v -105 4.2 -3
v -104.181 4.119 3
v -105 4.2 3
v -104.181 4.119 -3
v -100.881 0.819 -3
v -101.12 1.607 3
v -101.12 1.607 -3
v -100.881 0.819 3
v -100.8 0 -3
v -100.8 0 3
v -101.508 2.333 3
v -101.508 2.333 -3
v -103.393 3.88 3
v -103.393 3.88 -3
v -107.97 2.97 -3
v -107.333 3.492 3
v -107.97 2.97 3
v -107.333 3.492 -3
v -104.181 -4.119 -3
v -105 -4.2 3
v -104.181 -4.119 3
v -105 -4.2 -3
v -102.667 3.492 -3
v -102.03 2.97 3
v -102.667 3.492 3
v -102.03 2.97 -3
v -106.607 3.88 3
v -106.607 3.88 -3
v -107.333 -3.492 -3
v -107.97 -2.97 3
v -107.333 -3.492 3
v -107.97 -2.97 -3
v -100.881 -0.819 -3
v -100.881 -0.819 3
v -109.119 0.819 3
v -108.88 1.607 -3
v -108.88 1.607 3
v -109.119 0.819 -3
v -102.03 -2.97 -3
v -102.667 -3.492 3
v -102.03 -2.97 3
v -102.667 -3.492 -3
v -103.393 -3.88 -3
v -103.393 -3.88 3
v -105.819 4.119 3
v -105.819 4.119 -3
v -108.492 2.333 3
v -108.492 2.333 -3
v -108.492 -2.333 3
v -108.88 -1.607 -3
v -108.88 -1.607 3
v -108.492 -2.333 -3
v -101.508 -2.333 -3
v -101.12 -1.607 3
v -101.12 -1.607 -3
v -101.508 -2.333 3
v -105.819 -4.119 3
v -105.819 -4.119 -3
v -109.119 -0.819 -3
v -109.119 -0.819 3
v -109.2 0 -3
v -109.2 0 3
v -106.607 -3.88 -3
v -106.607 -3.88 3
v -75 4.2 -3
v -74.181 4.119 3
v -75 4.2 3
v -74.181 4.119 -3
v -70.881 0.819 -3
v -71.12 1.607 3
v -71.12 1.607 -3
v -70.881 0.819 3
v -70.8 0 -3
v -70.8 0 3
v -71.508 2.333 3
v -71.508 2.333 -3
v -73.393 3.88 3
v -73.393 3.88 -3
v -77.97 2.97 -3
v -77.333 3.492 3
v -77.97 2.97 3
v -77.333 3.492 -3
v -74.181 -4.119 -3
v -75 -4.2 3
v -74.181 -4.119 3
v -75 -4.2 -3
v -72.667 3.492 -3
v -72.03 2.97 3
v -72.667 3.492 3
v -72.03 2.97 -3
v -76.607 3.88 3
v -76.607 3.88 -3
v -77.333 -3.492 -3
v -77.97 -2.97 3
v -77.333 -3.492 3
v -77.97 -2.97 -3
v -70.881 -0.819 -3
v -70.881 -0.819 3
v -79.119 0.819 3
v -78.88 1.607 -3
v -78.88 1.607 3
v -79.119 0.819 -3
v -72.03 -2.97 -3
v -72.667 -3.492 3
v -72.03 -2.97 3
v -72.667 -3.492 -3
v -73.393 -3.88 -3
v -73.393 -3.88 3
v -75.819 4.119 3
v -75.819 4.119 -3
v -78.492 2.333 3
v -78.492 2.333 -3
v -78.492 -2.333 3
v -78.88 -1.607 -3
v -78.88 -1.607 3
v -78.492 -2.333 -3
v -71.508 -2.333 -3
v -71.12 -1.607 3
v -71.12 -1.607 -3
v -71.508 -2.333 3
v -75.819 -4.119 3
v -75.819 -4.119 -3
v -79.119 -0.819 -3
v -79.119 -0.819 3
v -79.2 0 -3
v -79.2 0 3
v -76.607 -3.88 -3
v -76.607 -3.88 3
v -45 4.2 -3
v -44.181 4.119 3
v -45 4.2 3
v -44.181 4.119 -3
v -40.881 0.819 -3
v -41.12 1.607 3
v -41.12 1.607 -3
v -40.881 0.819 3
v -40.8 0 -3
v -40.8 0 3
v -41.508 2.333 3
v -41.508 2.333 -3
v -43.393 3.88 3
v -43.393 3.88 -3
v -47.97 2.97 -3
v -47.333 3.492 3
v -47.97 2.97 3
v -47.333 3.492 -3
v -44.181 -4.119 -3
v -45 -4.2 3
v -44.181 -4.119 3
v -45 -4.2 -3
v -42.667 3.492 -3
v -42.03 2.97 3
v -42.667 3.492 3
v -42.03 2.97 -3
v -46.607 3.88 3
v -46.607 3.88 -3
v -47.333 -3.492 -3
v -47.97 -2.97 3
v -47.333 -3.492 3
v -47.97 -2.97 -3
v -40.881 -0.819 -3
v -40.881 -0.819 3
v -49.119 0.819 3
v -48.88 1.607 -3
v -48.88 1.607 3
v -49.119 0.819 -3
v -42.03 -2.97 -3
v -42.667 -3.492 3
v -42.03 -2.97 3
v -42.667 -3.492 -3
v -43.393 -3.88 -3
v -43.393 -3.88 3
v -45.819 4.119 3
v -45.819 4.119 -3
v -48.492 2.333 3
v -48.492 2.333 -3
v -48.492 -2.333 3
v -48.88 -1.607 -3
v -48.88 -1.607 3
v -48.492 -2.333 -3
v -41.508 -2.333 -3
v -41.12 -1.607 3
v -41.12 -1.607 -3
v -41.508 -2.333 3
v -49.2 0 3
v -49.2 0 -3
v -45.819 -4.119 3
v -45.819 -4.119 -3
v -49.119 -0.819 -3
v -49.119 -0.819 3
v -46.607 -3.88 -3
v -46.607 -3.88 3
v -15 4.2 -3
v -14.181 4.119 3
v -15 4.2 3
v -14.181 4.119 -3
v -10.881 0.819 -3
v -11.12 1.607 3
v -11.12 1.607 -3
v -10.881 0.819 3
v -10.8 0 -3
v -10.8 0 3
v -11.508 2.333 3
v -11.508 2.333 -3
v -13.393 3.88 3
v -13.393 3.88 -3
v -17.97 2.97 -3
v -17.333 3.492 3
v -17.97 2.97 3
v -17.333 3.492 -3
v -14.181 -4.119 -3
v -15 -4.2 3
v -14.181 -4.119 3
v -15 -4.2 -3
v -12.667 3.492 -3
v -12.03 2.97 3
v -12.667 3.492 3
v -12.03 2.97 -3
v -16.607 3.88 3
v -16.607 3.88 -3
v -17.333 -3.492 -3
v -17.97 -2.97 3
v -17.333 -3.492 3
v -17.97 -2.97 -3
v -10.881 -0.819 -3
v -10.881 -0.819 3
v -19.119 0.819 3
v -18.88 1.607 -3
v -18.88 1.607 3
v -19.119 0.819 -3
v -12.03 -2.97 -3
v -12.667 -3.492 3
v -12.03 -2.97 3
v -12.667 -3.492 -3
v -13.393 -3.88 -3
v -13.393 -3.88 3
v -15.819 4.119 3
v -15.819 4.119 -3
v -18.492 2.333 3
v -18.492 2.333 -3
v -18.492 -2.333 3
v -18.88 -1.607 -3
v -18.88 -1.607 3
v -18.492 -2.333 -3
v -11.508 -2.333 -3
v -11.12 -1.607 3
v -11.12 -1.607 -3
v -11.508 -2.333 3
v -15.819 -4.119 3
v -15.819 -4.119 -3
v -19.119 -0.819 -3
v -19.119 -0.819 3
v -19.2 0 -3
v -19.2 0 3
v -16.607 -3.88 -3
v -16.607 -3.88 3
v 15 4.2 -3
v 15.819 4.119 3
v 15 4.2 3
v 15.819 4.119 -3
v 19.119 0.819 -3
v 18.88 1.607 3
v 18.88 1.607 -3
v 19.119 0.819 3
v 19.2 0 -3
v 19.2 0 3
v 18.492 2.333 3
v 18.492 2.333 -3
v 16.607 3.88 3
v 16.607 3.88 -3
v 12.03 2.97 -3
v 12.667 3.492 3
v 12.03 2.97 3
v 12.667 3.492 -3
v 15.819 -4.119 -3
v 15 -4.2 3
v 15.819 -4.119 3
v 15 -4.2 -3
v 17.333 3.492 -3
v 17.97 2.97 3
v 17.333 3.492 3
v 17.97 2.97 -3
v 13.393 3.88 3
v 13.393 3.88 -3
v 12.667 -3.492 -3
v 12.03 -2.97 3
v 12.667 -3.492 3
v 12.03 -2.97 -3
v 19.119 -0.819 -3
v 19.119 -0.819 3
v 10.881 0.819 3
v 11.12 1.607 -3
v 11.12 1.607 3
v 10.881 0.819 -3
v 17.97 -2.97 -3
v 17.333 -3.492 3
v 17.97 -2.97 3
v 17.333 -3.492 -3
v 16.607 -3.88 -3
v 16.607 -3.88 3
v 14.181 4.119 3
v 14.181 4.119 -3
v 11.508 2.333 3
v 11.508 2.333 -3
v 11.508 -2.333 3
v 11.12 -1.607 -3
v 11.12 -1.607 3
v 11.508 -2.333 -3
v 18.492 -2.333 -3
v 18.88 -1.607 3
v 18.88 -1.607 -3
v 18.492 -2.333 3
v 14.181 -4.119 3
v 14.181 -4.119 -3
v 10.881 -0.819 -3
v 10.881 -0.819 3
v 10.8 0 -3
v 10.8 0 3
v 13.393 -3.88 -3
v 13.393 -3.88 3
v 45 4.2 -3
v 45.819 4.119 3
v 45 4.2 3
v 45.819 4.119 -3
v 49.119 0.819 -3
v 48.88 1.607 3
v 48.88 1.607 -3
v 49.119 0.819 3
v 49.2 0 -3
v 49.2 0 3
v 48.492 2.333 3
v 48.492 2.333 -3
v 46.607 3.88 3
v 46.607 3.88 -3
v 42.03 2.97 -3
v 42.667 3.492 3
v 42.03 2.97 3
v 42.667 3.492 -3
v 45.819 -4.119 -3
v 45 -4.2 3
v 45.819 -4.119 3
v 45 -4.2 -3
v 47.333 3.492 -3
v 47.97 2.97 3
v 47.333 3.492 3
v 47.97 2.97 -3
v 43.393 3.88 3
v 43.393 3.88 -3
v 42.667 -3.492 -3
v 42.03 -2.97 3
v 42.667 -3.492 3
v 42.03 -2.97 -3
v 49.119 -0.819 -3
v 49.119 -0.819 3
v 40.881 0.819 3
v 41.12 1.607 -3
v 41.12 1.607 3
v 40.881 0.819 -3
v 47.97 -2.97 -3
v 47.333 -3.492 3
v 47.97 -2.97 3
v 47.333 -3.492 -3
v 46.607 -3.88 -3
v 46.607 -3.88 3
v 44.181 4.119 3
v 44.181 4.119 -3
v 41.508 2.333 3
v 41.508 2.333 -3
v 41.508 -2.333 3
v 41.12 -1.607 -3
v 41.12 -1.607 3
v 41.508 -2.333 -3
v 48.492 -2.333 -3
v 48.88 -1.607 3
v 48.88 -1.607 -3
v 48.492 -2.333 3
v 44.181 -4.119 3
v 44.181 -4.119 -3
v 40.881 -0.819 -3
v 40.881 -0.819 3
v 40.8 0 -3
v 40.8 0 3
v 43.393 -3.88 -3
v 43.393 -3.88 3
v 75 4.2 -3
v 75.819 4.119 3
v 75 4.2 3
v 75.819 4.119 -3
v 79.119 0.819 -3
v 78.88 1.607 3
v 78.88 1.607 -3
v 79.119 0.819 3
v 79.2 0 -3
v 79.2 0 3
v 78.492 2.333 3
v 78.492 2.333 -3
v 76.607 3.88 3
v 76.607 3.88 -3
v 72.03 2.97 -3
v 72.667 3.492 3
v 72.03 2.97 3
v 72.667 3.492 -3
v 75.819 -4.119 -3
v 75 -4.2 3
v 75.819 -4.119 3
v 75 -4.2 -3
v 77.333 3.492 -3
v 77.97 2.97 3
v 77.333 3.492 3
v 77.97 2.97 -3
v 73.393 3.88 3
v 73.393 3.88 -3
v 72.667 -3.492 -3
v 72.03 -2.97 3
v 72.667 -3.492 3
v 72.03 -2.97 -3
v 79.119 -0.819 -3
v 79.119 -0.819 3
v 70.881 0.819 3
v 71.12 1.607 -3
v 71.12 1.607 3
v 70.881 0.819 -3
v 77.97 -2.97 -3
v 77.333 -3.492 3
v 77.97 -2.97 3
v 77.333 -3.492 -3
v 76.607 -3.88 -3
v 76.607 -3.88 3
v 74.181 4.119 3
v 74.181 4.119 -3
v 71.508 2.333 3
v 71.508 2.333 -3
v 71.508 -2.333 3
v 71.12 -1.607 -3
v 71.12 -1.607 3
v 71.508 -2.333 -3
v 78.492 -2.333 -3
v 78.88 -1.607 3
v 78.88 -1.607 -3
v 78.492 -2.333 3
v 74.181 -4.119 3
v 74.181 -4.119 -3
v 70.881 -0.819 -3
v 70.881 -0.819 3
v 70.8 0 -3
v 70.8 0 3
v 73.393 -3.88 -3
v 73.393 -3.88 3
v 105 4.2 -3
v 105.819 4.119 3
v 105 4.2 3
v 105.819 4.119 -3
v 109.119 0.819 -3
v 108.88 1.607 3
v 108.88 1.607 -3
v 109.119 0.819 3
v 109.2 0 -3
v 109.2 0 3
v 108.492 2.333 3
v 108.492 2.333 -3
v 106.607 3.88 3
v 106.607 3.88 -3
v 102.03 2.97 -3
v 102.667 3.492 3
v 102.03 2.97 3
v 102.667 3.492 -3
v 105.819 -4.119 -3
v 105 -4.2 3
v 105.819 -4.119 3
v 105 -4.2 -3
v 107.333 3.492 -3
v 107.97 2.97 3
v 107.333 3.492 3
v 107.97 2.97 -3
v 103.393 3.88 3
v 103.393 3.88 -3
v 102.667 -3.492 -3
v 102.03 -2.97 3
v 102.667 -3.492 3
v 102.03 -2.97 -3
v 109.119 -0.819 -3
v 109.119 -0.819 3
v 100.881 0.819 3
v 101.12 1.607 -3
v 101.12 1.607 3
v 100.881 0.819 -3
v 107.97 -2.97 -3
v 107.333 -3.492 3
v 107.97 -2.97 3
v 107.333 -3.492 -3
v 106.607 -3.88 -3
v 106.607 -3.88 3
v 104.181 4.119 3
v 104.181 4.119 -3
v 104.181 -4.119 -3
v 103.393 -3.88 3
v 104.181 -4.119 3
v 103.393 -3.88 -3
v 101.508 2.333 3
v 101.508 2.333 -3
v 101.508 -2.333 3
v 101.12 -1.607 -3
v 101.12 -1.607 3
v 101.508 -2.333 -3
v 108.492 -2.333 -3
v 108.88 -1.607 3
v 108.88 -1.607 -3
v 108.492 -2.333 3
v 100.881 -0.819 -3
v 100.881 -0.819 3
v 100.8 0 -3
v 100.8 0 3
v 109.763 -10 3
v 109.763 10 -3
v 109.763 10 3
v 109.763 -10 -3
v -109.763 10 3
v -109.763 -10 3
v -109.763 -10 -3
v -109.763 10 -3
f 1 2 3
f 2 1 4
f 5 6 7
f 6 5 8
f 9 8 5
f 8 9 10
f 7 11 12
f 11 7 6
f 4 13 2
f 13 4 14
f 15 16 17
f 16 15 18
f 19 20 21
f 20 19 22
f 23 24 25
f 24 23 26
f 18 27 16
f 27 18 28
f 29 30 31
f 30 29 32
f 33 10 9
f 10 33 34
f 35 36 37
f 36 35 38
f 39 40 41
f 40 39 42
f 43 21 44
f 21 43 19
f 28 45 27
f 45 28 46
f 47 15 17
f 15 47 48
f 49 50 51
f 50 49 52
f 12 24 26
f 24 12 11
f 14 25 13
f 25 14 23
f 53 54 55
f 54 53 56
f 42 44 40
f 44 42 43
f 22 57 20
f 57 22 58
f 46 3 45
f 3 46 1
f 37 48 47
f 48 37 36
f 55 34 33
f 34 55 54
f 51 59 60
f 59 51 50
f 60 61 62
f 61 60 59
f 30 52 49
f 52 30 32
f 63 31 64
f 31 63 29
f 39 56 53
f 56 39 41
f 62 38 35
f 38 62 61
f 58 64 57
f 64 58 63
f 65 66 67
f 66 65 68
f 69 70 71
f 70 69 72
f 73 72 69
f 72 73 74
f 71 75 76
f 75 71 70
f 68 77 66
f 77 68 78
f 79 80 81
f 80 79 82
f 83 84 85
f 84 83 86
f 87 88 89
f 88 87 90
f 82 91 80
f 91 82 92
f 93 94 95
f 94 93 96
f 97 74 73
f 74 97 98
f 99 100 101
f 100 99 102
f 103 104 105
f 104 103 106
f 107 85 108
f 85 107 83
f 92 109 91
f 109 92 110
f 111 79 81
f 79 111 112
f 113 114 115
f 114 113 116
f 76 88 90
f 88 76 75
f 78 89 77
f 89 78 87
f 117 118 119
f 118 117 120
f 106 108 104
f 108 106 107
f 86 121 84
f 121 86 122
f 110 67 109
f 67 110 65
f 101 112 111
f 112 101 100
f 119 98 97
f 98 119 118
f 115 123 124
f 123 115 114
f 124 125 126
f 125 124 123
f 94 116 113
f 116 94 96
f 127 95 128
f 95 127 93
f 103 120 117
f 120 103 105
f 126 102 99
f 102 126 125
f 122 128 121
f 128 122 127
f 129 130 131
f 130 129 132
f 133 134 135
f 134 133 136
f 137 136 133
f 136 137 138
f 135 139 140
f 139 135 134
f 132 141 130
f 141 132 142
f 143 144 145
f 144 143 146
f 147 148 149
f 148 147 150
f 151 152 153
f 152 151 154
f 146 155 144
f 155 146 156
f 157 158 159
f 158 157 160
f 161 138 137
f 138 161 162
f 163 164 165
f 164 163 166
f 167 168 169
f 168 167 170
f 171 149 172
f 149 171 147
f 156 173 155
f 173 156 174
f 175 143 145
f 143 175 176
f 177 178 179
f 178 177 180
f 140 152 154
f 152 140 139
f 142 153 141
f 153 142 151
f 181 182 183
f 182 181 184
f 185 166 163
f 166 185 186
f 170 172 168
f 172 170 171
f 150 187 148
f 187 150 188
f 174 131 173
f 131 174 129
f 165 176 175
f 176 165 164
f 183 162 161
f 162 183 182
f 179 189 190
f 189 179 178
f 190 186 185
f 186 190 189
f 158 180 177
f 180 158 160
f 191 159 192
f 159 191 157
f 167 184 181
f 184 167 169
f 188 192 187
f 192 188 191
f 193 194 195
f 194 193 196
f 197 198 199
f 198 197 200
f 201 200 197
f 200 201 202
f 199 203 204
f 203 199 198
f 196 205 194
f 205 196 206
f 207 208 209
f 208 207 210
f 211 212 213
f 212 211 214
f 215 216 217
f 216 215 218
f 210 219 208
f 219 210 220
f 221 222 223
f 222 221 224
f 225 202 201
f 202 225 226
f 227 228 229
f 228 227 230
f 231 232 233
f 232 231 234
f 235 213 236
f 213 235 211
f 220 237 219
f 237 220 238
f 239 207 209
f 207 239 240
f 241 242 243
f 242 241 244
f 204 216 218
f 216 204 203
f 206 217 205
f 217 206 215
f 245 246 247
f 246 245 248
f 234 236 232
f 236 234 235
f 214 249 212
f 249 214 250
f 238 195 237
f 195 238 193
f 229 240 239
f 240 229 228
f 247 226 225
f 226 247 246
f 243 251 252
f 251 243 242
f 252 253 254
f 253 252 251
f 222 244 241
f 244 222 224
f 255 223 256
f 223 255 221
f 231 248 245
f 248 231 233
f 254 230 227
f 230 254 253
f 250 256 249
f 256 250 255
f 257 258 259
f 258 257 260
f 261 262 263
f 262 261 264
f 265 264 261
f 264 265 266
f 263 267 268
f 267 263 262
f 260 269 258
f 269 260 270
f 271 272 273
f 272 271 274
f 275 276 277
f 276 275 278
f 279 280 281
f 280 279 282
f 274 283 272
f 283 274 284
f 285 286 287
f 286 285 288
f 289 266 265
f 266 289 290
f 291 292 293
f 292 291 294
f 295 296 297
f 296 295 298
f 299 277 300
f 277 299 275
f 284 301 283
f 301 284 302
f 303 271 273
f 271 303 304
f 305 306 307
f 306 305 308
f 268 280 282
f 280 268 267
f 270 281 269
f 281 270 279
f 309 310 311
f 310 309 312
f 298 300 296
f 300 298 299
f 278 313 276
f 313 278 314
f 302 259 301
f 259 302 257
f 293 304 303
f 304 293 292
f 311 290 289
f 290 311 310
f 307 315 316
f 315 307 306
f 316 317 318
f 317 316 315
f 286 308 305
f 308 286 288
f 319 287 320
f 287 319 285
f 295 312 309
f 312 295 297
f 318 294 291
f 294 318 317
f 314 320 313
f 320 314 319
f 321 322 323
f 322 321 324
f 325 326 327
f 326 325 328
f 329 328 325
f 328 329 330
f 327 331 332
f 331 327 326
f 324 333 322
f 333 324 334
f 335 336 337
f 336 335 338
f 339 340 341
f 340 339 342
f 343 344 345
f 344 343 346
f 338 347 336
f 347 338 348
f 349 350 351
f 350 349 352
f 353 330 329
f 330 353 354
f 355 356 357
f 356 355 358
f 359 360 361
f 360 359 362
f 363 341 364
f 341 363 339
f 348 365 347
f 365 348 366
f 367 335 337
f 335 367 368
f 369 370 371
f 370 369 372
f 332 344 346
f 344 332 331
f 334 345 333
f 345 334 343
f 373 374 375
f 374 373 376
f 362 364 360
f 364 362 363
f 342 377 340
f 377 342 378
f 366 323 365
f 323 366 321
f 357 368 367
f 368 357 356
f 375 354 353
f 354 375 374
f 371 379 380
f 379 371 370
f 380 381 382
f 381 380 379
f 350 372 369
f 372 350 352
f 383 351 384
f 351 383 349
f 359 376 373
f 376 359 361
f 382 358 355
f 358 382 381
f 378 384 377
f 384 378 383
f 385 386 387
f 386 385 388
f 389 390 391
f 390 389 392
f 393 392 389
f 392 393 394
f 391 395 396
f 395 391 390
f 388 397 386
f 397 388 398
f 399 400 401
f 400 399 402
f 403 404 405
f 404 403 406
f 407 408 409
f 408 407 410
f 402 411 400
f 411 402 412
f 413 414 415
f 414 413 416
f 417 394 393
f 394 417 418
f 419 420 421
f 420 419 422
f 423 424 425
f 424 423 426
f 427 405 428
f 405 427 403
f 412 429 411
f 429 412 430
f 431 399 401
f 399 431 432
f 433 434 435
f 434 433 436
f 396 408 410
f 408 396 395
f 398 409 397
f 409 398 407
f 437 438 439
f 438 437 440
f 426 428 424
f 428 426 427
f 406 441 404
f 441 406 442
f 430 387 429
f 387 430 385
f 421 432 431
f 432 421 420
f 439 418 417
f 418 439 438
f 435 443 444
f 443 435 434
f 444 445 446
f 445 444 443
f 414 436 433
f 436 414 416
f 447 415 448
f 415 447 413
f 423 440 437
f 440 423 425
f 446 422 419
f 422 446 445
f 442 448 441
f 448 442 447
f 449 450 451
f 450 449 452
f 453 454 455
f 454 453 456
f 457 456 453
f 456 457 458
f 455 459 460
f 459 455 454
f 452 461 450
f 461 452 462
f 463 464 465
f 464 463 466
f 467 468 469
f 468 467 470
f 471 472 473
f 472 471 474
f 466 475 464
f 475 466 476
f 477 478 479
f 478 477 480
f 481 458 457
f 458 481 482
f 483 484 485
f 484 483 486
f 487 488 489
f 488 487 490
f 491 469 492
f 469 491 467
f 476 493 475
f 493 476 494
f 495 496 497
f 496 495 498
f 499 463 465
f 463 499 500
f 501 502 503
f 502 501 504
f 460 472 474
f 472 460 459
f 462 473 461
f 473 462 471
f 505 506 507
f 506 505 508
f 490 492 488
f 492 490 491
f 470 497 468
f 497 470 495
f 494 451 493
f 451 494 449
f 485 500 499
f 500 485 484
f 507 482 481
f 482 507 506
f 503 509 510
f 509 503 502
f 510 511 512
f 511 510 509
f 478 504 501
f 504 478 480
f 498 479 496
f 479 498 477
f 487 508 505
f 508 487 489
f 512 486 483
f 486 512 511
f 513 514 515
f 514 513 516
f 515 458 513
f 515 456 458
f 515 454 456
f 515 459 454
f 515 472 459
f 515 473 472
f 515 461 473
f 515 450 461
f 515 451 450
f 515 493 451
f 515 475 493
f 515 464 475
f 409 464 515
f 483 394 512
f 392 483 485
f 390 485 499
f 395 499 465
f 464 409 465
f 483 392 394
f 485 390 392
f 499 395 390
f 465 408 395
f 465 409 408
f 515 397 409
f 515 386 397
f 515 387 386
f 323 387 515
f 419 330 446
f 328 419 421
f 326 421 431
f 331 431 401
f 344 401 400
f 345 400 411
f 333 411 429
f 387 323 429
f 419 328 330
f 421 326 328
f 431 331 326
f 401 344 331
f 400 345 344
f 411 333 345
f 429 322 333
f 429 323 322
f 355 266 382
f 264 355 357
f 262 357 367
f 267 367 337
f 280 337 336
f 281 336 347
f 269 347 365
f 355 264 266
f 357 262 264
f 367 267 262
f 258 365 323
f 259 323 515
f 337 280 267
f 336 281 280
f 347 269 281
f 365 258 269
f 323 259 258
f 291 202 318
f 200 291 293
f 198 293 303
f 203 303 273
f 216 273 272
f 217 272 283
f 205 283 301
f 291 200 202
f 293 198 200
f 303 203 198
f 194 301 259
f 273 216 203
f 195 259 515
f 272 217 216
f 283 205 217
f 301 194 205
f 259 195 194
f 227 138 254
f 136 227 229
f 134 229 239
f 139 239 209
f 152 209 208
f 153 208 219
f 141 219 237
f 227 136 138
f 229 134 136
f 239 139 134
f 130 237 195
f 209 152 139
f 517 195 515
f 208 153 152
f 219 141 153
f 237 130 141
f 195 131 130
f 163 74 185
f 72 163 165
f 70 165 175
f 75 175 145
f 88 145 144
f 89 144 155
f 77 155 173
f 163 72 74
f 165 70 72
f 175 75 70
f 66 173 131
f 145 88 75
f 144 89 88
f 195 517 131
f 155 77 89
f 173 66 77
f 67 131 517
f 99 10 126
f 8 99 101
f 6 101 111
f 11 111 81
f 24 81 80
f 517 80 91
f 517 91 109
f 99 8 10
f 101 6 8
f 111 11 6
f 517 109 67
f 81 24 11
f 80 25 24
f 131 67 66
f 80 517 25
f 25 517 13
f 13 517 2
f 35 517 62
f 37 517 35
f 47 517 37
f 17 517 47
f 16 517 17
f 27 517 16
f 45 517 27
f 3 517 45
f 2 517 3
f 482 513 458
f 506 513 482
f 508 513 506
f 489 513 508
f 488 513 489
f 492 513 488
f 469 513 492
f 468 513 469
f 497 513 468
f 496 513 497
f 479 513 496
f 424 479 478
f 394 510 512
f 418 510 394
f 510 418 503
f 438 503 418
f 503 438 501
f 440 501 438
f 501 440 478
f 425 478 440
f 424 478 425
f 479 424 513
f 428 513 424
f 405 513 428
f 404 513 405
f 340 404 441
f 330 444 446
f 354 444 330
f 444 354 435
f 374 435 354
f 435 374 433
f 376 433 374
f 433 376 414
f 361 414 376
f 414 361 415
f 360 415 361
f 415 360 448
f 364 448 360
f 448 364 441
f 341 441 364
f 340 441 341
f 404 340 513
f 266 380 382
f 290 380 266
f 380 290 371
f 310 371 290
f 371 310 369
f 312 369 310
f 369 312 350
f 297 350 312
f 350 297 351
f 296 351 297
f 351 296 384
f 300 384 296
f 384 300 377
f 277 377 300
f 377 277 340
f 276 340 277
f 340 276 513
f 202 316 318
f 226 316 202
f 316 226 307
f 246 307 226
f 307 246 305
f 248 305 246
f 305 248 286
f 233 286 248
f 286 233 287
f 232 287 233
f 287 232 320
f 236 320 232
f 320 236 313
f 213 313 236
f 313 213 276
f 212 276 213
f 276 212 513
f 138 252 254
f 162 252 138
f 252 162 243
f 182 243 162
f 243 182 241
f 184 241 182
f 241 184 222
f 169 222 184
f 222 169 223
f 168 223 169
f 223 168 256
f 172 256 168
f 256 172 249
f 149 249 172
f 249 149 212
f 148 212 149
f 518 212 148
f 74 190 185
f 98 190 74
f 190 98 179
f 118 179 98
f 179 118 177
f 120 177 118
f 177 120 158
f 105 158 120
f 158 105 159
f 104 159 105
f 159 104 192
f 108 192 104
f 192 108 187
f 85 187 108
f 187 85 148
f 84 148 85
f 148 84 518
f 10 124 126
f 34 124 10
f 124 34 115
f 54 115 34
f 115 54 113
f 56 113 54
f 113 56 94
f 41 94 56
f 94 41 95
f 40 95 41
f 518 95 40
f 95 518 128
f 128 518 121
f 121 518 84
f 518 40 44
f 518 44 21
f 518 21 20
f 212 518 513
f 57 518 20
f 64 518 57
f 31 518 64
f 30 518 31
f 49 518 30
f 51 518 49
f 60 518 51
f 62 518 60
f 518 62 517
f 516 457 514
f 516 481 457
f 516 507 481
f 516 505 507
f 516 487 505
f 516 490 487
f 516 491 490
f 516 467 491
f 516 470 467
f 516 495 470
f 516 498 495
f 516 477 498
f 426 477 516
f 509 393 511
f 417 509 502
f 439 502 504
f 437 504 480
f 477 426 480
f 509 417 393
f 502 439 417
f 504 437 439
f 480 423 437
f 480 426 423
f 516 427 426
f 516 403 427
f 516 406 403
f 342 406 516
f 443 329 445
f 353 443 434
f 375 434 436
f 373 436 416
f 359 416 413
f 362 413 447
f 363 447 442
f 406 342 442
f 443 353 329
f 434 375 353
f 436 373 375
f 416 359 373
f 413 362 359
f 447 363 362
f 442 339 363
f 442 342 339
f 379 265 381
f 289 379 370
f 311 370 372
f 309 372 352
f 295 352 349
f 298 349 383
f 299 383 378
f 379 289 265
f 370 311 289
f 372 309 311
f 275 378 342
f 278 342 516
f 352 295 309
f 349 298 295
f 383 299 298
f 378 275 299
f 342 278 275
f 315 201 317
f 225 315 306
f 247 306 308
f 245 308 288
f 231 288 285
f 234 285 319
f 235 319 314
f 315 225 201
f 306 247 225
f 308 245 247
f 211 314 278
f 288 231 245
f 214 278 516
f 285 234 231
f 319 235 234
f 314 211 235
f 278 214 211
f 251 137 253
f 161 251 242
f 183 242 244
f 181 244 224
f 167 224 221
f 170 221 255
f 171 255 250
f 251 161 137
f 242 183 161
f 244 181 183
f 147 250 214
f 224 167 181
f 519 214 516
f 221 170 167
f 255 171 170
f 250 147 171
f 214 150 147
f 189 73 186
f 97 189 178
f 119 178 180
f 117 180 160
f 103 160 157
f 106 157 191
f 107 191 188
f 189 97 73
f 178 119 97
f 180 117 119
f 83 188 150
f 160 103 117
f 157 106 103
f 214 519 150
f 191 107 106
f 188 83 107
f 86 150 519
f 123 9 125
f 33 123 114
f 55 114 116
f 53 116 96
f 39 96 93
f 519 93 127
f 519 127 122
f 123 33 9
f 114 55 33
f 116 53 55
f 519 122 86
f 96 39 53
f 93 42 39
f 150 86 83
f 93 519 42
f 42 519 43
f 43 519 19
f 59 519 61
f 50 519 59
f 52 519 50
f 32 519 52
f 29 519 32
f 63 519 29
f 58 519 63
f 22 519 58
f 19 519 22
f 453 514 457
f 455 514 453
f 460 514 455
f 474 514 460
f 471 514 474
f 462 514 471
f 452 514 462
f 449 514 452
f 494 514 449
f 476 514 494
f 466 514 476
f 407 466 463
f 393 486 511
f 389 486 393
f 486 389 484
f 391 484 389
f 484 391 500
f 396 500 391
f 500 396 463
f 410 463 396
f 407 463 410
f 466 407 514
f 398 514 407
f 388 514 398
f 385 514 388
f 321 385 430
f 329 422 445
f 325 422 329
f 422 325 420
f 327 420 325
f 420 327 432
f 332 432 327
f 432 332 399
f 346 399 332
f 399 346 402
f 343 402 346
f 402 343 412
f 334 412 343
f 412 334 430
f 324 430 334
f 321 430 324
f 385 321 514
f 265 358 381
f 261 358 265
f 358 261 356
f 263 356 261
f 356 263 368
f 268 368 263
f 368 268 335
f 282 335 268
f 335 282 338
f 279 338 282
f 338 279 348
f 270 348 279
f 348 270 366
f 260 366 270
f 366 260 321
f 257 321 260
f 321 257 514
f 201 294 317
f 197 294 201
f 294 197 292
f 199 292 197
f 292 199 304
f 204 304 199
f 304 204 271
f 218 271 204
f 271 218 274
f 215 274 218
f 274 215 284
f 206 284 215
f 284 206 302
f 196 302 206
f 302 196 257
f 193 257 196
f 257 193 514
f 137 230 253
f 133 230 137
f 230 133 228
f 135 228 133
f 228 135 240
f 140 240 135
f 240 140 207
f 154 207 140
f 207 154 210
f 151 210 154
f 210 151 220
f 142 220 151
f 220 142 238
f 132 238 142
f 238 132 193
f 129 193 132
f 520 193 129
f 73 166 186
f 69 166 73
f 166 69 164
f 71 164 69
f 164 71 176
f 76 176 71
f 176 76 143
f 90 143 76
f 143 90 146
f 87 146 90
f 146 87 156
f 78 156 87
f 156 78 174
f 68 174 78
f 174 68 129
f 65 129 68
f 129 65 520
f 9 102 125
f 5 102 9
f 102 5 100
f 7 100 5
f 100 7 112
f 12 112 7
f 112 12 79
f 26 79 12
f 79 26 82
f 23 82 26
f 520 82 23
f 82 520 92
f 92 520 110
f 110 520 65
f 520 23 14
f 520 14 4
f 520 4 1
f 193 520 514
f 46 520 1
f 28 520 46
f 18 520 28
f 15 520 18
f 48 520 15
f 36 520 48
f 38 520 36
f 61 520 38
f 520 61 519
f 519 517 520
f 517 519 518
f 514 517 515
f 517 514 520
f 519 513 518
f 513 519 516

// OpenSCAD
$fn = 32;

// ----------------------------------------------------------------------
// Hole bar, 8 x Ø8.4
// skip layout, 4.7625 mm edge offset
// ----------------------------------------------------------------------

// --- parameters (mm) ---
bar_w = 20;       // bar width (Y)
bar_t = 6;        // bar thickness (Z)
holes = 8;        // holes per row
hole_d = 8.4;     // hole diameter
edge = 4.763;     // offset from the bar end to the first hole
grid_pitch = 15;  // grid the bar was laid out on

// --- derived feature positions (mm) ---
pitch = grid_pitch * 2;       // = 30   holes sit every other grid slot
span = (holes - 1) * pitch;   // = 210   distance between the end holes
bar_l = span + 2 * edge;      // = 219.53   overall bar length
start_x = -bar_l / 2 + edge;  // = -105   X of the first hole
feature_centers = [
  [start_x + 0 * pitch, 0],
  [start_x + 1 * pitch, 0],
  [start_x + 2 * pitch, 0],
  [start_x + 3 * pitch, 0],
  [start_x + 4 * pitch, 0],
  [start_x + 5 * pitch, 0],
  [start_x + 6 * pitch, 0],
  [start_x + 7 * pitch, 0]
];   // hole centres of the first row

// bar with one row of holes, drilled from feature_centers
difference() {
  translate([-bar_l / 2, -bar_w / 2, -bar_t / 2]) cube([bar_l, bar_w, bar_t]);
  for (centre = feature_centers)
    translate([centre[0], centre[1], 0])
      cylinder(d = hole_d, h = bar_t + 2, center = true);
}
